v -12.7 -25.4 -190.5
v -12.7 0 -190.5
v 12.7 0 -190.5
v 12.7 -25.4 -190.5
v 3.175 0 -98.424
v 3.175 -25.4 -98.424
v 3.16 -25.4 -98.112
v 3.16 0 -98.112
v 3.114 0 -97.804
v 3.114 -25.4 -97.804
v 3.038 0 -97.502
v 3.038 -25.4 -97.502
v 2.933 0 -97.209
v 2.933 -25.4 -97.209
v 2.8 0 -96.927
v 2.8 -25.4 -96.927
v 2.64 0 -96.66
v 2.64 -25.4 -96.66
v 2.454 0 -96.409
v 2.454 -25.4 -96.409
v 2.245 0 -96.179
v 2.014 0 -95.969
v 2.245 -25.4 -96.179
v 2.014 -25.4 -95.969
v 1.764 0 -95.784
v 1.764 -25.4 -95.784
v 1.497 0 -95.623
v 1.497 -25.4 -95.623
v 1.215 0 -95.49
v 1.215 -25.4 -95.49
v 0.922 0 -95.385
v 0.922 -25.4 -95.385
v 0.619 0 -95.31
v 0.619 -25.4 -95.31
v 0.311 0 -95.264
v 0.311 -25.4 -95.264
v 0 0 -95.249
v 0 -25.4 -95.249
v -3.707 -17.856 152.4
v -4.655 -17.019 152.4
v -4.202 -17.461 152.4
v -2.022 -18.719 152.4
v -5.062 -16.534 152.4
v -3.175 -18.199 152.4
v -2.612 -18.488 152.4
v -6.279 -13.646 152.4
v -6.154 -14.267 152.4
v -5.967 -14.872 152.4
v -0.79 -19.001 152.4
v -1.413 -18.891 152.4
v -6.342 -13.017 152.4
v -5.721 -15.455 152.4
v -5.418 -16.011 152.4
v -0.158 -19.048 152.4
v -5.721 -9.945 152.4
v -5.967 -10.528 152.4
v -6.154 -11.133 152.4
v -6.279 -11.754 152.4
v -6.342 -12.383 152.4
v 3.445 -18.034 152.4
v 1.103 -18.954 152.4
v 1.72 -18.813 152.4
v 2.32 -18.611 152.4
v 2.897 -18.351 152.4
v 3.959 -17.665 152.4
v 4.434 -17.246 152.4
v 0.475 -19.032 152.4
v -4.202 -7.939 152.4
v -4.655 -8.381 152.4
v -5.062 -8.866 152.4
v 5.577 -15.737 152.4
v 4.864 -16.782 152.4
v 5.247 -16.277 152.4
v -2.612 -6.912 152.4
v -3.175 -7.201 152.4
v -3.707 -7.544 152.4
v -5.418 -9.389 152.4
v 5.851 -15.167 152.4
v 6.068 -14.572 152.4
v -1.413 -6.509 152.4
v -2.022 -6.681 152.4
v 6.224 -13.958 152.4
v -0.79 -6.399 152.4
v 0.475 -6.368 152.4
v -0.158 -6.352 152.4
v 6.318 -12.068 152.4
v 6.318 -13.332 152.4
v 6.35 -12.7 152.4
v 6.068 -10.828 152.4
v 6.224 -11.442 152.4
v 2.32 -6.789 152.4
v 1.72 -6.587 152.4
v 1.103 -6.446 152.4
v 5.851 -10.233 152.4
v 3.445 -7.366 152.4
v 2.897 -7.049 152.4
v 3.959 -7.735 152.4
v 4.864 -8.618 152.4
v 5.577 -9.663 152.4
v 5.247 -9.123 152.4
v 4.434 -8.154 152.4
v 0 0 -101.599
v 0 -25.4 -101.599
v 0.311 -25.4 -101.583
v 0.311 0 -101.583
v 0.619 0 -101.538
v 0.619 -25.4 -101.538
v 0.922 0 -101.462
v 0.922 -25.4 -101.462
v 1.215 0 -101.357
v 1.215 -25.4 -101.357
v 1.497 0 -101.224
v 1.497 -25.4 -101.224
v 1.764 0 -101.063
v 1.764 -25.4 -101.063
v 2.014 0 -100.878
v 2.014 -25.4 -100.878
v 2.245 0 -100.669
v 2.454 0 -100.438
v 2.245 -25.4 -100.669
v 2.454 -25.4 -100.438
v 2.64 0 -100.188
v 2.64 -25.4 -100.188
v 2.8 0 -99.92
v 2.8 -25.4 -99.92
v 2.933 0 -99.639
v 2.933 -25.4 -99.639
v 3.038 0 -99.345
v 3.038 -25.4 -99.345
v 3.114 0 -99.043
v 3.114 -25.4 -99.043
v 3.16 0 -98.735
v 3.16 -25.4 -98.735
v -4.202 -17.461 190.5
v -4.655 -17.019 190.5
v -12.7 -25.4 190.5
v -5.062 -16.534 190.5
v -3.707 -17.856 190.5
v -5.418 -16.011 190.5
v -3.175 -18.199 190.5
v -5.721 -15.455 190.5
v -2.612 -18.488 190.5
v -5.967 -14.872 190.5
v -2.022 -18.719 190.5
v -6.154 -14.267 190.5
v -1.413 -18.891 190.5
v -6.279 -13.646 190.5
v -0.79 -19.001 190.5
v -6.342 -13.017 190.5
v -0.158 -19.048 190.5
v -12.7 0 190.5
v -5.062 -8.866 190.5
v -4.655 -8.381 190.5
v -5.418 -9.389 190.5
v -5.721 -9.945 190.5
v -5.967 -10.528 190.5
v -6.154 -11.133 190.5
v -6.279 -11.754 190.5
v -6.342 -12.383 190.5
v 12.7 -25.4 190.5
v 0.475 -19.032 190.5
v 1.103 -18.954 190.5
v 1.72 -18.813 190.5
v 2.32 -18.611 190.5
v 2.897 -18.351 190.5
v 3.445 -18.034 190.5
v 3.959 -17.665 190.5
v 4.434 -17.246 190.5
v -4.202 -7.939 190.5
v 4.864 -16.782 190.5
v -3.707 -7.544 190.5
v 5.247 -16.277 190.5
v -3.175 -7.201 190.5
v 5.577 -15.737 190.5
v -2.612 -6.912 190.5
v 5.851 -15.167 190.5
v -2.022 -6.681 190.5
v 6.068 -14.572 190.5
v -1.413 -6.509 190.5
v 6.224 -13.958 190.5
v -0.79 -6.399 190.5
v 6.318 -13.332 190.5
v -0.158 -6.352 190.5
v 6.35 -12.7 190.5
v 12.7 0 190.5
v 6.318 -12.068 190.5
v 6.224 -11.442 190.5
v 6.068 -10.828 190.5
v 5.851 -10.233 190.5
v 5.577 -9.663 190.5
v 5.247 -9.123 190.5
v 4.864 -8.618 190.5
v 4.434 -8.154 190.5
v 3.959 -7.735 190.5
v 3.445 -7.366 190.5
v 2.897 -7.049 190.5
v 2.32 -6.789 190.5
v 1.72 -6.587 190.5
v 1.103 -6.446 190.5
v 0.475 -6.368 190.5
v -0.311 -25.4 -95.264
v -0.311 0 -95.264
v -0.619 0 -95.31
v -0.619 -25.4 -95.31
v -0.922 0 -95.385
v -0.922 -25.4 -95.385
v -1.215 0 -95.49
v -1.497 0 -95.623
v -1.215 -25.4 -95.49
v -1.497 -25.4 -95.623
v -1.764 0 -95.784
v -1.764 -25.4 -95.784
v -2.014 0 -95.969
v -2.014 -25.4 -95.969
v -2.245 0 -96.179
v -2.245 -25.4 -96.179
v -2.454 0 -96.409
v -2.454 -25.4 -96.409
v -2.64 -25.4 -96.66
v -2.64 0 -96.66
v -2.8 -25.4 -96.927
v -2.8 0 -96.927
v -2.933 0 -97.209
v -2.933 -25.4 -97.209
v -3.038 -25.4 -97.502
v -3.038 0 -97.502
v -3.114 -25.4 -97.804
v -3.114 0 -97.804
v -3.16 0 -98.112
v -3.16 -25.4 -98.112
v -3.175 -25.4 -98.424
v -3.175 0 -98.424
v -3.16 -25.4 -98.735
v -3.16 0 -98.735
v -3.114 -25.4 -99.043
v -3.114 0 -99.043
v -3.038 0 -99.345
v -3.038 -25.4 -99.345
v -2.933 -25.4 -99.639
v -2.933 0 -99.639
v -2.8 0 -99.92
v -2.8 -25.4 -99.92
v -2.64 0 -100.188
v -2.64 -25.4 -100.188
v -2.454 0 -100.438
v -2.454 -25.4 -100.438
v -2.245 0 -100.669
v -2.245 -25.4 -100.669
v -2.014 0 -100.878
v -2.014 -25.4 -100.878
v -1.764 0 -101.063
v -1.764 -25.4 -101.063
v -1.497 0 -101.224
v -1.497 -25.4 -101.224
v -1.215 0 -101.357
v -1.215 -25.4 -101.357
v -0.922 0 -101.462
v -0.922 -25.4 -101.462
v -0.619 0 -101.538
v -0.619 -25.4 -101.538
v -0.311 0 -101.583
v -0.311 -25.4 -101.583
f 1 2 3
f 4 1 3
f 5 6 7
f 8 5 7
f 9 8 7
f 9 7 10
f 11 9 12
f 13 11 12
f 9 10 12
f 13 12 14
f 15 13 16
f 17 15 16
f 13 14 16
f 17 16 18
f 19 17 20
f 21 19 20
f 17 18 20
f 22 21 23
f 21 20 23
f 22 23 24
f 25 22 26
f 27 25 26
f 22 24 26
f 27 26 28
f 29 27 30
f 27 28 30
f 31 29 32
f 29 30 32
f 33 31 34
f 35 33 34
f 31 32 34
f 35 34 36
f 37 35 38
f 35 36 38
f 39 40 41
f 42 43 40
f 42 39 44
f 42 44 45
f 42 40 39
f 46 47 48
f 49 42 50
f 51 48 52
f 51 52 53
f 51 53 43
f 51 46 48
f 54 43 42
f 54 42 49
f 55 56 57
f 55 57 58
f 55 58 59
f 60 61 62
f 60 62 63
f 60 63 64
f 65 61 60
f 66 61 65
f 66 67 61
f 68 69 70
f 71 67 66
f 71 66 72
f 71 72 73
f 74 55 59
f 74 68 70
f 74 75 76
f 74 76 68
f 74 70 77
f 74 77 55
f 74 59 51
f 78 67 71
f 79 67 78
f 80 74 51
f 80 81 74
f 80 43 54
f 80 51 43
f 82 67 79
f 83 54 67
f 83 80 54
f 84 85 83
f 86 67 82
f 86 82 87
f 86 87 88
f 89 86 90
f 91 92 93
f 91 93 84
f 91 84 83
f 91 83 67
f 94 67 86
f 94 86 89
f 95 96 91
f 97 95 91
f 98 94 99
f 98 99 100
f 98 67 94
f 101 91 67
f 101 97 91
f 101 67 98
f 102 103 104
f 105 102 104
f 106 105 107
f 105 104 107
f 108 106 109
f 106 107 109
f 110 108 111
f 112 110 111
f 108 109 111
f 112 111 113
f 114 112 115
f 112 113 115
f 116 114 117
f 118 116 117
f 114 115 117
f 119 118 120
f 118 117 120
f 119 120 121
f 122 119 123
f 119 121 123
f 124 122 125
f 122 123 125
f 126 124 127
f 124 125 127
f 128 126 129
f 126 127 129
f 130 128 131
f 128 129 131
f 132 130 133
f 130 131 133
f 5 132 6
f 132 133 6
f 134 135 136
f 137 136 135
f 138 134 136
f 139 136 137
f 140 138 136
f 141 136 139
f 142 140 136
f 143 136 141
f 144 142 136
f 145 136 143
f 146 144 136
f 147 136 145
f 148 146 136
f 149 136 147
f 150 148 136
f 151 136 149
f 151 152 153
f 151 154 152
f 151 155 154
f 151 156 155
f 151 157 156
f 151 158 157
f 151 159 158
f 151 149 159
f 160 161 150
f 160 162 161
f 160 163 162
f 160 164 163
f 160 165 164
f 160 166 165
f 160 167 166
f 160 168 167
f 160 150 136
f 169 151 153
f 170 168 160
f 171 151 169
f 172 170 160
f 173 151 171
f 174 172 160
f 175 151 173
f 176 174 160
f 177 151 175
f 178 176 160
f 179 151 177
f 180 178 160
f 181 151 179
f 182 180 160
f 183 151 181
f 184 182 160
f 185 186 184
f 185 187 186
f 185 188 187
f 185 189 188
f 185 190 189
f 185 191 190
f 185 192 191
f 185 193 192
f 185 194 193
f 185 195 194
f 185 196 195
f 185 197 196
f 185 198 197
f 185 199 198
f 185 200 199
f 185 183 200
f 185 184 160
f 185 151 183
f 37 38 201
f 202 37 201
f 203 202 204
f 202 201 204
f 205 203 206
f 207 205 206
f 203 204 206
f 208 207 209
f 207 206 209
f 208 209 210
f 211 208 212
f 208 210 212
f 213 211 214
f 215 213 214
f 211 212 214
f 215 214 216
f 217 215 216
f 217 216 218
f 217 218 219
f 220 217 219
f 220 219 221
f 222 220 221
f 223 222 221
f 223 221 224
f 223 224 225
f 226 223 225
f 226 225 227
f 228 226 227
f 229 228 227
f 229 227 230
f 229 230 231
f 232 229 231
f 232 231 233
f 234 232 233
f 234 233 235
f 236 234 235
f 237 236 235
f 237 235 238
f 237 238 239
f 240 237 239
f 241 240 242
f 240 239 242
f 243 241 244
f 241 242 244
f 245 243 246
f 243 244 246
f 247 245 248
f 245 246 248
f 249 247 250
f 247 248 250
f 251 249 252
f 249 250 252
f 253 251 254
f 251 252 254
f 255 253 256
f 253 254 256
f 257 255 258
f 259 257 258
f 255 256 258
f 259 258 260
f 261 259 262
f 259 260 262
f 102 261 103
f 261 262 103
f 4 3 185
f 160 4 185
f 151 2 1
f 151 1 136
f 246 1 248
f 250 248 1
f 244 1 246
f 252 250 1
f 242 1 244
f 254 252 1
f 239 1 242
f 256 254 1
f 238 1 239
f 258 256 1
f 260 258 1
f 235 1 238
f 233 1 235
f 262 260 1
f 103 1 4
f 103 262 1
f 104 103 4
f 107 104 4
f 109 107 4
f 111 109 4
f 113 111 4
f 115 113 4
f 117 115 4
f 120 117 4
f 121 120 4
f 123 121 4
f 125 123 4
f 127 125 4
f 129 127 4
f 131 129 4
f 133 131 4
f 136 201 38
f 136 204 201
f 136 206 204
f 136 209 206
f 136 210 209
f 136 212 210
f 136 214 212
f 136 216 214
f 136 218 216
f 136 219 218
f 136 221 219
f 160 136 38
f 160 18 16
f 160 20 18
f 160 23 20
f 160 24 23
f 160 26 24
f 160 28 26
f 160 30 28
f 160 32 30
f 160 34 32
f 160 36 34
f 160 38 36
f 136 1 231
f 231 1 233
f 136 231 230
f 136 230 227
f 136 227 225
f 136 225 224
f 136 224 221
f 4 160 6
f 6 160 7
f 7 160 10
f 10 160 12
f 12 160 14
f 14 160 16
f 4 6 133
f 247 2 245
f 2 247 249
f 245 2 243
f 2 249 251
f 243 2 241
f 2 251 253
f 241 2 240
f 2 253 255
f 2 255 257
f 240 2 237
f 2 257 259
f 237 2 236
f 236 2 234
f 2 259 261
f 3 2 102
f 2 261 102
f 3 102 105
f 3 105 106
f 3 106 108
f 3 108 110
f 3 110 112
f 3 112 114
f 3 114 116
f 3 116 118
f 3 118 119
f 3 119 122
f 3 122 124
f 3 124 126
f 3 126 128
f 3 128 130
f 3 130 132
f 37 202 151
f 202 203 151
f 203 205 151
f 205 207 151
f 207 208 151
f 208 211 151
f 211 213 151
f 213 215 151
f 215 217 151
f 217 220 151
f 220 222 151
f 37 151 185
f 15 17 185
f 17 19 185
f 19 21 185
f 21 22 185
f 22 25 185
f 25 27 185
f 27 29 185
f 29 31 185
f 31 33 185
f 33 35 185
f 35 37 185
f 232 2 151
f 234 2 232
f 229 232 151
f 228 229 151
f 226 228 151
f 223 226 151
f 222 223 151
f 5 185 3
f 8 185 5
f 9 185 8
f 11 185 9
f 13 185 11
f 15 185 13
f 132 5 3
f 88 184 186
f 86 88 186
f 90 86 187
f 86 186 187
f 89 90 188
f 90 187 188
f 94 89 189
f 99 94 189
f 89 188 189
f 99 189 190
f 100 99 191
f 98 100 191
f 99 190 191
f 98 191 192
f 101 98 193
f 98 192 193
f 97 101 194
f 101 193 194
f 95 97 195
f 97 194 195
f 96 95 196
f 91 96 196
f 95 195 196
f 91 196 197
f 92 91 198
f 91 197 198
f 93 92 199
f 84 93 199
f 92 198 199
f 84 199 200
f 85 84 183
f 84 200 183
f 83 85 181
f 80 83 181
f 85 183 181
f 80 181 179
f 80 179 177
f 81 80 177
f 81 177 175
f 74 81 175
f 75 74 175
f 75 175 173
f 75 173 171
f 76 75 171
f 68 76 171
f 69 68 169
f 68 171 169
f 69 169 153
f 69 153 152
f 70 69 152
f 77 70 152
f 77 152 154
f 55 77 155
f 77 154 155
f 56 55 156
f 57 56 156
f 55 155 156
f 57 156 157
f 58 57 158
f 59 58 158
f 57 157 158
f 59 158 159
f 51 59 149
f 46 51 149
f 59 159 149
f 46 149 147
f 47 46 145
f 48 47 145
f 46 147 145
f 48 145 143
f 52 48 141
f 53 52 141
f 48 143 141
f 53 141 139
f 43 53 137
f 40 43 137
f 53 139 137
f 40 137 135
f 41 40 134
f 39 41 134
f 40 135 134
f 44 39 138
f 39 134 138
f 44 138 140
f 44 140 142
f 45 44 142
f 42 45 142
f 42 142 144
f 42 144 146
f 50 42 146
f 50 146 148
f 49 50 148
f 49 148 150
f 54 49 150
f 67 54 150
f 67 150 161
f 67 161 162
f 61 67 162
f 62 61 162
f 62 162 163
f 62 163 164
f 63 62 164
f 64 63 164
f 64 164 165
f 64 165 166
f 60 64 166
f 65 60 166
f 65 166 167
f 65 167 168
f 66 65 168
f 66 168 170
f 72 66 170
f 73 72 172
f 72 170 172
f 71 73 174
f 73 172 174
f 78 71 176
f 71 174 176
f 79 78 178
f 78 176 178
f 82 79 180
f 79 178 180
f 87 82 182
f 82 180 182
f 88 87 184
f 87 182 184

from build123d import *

# Parameters (mm, degrees)
F0_W     = 25.4
F0_H     = 381
F1_DEPTH = 25.4
F2_R     = 6.35
F3_DEPTH = 38.1
F5_DEPTH = 25.401


with BuildPart() as f1:
    # F0 (on Front) → F1 (new body)
    with BuildSketch(Plane.XZ):
        Rectangle(F0_W, F0_H)
    extrude(amount=F1_DEPTH)

    # F2 (on face) → F3 (cut)
    with BuildSketch(Plane.XY.offset(190.5)):
        with Locations((0, -12.7)):
            Circle(F2_R)
    extrude(amount=-F3_DEPTH, mode=Mode.SUBTRACT)

    # F4 (on face) → F5 (cut, through all)
    with BuildSketch(Plane.XZ.offset(25.4)):
        with BuildLine():
            ThreePointArc((0, -95.24857), (-3.175, -98.42357), (0, -101.59857))
            Line((0, -101.59857), (0, -95.24857))
        make_face()
        with BuildLine():
            Line((0, -95.24857), (0, -101.59857))
            ThreePointArc((0, -101.59857), (2.245064, -100.668634), (3.175, -98.42357))
            ThreePointArc((3.175, -98.42357), (2.245064, -96.178506), (0, -95.24857))
        make_face()
    extrude(amount=-F5_DEPTH, mode=Mode.SUBTRACT)


solid = f1.part
